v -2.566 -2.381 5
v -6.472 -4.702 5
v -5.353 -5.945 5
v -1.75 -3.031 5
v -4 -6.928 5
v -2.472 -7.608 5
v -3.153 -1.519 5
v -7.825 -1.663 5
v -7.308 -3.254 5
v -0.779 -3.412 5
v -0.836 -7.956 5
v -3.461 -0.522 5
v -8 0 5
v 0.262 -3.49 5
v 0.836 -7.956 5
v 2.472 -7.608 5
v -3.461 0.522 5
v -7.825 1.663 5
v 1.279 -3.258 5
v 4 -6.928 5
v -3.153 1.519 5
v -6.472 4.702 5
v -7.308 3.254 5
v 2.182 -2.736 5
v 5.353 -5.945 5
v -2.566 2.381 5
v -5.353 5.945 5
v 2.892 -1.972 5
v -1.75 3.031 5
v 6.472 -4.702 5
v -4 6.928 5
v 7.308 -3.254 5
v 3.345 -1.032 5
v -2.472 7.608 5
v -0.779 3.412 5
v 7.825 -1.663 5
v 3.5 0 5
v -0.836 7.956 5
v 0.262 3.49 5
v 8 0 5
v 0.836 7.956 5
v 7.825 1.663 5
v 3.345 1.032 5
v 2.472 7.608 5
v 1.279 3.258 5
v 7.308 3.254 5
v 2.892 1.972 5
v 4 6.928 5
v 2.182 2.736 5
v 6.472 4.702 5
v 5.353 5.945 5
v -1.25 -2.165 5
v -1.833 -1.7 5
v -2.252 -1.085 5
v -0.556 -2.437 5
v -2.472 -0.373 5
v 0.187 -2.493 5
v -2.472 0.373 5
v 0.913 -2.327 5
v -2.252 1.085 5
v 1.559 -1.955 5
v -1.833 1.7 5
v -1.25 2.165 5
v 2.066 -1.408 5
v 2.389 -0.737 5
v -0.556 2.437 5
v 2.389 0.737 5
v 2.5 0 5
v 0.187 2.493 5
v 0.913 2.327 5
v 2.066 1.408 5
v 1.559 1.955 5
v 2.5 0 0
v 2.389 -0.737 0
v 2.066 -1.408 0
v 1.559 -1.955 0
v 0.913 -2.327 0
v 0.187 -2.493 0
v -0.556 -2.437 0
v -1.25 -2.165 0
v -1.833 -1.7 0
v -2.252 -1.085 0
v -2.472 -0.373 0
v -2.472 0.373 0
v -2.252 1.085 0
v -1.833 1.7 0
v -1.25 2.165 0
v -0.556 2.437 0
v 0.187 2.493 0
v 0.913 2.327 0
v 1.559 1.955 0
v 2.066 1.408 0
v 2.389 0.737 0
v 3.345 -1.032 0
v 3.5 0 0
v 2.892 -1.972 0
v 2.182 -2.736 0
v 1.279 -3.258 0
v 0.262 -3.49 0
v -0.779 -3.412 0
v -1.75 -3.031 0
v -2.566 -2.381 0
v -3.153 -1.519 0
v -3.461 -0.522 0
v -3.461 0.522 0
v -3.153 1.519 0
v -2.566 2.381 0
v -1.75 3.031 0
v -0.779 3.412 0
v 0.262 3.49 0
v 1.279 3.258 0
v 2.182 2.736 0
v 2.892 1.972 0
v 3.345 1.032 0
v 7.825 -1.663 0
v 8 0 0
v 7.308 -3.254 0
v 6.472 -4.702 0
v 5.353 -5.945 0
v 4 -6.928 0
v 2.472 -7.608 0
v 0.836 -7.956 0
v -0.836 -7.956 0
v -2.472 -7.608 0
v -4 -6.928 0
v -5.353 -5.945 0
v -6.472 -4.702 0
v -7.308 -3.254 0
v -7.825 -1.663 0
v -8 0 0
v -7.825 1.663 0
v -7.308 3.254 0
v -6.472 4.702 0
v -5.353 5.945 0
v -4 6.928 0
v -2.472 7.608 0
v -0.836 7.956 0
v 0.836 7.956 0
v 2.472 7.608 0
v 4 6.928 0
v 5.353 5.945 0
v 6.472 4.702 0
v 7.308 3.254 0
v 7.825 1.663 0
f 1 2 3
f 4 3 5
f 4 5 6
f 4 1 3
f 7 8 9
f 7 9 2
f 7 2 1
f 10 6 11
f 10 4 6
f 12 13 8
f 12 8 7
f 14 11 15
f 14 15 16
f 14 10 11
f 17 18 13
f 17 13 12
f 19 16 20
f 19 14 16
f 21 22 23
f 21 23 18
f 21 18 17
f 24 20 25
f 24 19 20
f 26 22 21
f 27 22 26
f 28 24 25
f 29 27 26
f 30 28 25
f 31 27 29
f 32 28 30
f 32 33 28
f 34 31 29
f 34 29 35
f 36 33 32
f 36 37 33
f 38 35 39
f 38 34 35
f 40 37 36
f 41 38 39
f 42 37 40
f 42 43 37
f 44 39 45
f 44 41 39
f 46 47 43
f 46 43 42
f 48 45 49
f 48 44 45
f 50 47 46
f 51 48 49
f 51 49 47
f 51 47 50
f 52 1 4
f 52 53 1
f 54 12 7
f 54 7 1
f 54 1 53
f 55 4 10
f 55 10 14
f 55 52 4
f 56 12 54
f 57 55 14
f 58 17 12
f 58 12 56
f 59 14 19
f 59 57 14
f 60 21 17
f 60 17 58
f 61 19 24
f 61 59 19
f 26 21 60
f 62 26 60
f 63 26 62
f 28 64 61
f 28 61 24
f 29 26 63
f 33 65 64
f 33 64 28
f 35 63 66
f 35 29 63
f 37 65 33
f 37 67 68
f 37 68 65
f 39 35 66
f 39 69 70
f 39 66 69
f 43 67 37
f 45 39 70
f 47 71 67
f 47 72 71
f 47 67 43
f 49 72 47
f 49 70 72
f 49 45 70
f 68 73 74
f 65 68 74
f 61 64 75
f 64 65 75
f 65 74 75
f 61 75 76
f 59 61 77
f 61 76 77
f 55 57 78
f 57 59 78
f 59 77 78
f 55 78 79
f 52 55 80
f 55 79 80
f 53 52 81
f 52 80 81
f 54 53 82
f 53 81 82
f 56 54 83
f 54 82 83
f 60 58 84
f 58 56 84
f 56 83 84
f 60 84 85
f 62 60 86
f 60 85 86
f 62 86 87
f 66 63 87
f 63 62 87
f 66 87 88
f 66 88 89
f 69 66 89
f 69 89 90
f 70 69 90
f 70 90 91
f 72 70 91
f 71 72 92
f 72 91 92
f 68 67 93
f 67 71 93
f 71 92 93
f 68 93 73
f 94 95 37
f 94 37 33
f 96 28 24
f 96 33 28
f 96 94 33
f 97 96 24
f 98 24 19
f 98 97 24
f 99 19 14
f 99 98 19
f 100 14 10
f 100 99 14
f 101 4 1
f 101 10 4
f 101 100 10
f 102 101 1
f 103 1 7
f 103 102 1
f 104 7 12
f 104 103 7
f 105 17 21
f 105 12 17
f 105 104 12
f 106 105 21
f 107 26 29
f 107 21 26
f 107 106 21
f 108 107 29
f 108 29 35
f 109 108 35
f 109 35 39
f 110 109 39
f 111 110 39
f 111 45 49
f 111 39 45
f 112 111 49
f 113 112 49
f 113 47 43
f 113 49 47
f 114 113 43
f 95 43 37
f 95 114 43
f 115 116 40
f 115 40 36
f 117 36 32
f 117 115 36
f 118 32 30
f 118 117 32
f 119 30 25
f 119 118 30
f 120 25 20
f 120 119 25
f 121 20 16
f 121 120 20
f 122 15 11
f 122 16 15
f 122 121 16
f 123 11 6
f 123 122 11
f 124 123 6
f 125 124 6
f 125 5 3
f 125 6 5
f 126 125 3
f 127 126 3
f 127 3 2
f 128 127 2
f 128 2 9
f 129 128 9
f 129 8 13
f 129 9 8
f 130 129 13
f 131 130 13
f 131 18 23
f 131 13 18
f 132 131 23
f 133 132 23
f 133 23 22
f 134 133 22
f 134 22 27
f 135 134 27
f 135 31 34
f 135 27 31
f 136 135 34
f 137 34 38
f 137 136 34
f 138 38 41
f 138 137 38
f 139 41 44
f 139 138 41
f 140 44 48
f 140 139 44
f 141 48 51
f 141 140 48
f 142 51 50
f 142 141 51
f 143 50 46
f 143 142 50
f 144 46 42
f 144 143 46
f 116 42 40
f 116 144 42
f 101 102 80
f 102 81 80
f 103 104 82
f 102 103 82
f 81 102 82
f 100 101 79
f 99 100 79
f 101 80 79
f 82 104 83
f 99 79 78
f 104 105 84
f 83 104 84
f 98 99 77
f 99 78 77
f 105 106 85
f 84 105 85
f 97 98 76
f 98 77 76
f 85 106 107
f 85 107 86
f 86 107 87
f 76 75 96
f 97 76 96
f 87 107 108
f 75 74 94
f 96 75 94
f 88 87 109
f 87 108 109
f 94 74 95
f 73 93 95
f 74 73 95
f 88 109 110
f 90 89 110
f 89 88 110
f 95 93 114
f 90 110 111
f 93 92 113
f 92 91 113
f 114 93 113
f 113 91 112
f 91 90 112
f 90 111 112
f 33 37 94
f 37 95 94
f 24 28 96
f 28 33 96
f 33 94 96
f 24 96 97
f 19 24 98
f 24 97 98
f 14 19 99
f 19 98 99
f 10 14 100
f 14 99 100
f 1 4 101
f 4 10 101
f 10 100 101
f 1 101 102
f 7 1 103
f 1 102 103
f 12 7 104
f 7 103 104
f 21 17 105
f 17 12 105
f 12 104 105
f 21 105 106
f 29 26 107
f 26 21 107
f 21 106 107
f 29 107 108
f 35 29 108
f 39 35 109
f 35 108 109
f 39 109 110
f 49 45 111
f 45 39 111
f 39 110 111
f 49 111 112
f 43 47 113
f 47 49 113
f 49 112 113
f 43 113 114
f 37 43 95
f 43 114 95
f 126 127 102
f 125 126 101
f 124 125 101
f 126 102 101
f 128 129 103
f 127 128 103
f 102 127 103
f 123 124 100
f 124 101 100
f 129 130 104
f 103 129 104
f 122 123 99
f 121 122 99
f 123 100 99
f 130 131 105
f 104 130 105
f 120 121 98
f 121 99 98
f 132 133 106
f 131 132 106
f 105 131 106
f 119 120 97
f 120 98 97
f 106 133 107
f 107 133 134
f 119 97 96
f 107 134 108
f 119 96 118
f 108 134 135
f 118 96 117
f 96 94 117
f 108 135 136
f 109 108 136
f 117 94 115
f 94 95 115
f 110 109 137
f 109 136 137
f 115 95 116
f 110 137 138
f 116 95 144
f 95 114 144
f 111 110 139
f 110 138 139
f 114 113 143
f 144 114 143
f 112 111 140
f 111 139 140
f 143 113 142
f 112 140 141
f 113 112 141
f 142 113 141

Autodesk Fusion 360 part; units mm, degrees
sketch "Sketch1" plane through (0, 0, 0) normal (0, 0, 1) x (1, 0, 0) in component "inner bearing"
  circle A0 centre (0, 0) radius 3.5
  circle A1 centre (0, 0) radius 2.5
  dimension "d1" = 5
  dimension "d2" = 1
extrude "Extrude1" add sketch "Sketch1" along normal blind 5 makes body 1 in component "inner bearing"
sketch "Sketch1 (2)" plane through (0, 0, 0) normal (0, 0, 1) x (1, 0, 0) in component "outer bearing"
  circle A0 centre (0, 0) radius 8
  circle A1 centre (0, 0) radius 3.5
  dimension "d5" = 16
extrude "Extrude1'" add sketch "Sketch1 (2)" along normal up to surface (5 mm away) separate body makes body 2 in component "outer bearing"
component "inner bearing" placed x (1, 0, 0) y (0, 1, 0) z (0, 0, 1) at (0, 0, 0)
component "outer bearing" placed x (1, 0, 0) y (0, 1, 0) z (0, 0, 1) at (0, 0, 0)
